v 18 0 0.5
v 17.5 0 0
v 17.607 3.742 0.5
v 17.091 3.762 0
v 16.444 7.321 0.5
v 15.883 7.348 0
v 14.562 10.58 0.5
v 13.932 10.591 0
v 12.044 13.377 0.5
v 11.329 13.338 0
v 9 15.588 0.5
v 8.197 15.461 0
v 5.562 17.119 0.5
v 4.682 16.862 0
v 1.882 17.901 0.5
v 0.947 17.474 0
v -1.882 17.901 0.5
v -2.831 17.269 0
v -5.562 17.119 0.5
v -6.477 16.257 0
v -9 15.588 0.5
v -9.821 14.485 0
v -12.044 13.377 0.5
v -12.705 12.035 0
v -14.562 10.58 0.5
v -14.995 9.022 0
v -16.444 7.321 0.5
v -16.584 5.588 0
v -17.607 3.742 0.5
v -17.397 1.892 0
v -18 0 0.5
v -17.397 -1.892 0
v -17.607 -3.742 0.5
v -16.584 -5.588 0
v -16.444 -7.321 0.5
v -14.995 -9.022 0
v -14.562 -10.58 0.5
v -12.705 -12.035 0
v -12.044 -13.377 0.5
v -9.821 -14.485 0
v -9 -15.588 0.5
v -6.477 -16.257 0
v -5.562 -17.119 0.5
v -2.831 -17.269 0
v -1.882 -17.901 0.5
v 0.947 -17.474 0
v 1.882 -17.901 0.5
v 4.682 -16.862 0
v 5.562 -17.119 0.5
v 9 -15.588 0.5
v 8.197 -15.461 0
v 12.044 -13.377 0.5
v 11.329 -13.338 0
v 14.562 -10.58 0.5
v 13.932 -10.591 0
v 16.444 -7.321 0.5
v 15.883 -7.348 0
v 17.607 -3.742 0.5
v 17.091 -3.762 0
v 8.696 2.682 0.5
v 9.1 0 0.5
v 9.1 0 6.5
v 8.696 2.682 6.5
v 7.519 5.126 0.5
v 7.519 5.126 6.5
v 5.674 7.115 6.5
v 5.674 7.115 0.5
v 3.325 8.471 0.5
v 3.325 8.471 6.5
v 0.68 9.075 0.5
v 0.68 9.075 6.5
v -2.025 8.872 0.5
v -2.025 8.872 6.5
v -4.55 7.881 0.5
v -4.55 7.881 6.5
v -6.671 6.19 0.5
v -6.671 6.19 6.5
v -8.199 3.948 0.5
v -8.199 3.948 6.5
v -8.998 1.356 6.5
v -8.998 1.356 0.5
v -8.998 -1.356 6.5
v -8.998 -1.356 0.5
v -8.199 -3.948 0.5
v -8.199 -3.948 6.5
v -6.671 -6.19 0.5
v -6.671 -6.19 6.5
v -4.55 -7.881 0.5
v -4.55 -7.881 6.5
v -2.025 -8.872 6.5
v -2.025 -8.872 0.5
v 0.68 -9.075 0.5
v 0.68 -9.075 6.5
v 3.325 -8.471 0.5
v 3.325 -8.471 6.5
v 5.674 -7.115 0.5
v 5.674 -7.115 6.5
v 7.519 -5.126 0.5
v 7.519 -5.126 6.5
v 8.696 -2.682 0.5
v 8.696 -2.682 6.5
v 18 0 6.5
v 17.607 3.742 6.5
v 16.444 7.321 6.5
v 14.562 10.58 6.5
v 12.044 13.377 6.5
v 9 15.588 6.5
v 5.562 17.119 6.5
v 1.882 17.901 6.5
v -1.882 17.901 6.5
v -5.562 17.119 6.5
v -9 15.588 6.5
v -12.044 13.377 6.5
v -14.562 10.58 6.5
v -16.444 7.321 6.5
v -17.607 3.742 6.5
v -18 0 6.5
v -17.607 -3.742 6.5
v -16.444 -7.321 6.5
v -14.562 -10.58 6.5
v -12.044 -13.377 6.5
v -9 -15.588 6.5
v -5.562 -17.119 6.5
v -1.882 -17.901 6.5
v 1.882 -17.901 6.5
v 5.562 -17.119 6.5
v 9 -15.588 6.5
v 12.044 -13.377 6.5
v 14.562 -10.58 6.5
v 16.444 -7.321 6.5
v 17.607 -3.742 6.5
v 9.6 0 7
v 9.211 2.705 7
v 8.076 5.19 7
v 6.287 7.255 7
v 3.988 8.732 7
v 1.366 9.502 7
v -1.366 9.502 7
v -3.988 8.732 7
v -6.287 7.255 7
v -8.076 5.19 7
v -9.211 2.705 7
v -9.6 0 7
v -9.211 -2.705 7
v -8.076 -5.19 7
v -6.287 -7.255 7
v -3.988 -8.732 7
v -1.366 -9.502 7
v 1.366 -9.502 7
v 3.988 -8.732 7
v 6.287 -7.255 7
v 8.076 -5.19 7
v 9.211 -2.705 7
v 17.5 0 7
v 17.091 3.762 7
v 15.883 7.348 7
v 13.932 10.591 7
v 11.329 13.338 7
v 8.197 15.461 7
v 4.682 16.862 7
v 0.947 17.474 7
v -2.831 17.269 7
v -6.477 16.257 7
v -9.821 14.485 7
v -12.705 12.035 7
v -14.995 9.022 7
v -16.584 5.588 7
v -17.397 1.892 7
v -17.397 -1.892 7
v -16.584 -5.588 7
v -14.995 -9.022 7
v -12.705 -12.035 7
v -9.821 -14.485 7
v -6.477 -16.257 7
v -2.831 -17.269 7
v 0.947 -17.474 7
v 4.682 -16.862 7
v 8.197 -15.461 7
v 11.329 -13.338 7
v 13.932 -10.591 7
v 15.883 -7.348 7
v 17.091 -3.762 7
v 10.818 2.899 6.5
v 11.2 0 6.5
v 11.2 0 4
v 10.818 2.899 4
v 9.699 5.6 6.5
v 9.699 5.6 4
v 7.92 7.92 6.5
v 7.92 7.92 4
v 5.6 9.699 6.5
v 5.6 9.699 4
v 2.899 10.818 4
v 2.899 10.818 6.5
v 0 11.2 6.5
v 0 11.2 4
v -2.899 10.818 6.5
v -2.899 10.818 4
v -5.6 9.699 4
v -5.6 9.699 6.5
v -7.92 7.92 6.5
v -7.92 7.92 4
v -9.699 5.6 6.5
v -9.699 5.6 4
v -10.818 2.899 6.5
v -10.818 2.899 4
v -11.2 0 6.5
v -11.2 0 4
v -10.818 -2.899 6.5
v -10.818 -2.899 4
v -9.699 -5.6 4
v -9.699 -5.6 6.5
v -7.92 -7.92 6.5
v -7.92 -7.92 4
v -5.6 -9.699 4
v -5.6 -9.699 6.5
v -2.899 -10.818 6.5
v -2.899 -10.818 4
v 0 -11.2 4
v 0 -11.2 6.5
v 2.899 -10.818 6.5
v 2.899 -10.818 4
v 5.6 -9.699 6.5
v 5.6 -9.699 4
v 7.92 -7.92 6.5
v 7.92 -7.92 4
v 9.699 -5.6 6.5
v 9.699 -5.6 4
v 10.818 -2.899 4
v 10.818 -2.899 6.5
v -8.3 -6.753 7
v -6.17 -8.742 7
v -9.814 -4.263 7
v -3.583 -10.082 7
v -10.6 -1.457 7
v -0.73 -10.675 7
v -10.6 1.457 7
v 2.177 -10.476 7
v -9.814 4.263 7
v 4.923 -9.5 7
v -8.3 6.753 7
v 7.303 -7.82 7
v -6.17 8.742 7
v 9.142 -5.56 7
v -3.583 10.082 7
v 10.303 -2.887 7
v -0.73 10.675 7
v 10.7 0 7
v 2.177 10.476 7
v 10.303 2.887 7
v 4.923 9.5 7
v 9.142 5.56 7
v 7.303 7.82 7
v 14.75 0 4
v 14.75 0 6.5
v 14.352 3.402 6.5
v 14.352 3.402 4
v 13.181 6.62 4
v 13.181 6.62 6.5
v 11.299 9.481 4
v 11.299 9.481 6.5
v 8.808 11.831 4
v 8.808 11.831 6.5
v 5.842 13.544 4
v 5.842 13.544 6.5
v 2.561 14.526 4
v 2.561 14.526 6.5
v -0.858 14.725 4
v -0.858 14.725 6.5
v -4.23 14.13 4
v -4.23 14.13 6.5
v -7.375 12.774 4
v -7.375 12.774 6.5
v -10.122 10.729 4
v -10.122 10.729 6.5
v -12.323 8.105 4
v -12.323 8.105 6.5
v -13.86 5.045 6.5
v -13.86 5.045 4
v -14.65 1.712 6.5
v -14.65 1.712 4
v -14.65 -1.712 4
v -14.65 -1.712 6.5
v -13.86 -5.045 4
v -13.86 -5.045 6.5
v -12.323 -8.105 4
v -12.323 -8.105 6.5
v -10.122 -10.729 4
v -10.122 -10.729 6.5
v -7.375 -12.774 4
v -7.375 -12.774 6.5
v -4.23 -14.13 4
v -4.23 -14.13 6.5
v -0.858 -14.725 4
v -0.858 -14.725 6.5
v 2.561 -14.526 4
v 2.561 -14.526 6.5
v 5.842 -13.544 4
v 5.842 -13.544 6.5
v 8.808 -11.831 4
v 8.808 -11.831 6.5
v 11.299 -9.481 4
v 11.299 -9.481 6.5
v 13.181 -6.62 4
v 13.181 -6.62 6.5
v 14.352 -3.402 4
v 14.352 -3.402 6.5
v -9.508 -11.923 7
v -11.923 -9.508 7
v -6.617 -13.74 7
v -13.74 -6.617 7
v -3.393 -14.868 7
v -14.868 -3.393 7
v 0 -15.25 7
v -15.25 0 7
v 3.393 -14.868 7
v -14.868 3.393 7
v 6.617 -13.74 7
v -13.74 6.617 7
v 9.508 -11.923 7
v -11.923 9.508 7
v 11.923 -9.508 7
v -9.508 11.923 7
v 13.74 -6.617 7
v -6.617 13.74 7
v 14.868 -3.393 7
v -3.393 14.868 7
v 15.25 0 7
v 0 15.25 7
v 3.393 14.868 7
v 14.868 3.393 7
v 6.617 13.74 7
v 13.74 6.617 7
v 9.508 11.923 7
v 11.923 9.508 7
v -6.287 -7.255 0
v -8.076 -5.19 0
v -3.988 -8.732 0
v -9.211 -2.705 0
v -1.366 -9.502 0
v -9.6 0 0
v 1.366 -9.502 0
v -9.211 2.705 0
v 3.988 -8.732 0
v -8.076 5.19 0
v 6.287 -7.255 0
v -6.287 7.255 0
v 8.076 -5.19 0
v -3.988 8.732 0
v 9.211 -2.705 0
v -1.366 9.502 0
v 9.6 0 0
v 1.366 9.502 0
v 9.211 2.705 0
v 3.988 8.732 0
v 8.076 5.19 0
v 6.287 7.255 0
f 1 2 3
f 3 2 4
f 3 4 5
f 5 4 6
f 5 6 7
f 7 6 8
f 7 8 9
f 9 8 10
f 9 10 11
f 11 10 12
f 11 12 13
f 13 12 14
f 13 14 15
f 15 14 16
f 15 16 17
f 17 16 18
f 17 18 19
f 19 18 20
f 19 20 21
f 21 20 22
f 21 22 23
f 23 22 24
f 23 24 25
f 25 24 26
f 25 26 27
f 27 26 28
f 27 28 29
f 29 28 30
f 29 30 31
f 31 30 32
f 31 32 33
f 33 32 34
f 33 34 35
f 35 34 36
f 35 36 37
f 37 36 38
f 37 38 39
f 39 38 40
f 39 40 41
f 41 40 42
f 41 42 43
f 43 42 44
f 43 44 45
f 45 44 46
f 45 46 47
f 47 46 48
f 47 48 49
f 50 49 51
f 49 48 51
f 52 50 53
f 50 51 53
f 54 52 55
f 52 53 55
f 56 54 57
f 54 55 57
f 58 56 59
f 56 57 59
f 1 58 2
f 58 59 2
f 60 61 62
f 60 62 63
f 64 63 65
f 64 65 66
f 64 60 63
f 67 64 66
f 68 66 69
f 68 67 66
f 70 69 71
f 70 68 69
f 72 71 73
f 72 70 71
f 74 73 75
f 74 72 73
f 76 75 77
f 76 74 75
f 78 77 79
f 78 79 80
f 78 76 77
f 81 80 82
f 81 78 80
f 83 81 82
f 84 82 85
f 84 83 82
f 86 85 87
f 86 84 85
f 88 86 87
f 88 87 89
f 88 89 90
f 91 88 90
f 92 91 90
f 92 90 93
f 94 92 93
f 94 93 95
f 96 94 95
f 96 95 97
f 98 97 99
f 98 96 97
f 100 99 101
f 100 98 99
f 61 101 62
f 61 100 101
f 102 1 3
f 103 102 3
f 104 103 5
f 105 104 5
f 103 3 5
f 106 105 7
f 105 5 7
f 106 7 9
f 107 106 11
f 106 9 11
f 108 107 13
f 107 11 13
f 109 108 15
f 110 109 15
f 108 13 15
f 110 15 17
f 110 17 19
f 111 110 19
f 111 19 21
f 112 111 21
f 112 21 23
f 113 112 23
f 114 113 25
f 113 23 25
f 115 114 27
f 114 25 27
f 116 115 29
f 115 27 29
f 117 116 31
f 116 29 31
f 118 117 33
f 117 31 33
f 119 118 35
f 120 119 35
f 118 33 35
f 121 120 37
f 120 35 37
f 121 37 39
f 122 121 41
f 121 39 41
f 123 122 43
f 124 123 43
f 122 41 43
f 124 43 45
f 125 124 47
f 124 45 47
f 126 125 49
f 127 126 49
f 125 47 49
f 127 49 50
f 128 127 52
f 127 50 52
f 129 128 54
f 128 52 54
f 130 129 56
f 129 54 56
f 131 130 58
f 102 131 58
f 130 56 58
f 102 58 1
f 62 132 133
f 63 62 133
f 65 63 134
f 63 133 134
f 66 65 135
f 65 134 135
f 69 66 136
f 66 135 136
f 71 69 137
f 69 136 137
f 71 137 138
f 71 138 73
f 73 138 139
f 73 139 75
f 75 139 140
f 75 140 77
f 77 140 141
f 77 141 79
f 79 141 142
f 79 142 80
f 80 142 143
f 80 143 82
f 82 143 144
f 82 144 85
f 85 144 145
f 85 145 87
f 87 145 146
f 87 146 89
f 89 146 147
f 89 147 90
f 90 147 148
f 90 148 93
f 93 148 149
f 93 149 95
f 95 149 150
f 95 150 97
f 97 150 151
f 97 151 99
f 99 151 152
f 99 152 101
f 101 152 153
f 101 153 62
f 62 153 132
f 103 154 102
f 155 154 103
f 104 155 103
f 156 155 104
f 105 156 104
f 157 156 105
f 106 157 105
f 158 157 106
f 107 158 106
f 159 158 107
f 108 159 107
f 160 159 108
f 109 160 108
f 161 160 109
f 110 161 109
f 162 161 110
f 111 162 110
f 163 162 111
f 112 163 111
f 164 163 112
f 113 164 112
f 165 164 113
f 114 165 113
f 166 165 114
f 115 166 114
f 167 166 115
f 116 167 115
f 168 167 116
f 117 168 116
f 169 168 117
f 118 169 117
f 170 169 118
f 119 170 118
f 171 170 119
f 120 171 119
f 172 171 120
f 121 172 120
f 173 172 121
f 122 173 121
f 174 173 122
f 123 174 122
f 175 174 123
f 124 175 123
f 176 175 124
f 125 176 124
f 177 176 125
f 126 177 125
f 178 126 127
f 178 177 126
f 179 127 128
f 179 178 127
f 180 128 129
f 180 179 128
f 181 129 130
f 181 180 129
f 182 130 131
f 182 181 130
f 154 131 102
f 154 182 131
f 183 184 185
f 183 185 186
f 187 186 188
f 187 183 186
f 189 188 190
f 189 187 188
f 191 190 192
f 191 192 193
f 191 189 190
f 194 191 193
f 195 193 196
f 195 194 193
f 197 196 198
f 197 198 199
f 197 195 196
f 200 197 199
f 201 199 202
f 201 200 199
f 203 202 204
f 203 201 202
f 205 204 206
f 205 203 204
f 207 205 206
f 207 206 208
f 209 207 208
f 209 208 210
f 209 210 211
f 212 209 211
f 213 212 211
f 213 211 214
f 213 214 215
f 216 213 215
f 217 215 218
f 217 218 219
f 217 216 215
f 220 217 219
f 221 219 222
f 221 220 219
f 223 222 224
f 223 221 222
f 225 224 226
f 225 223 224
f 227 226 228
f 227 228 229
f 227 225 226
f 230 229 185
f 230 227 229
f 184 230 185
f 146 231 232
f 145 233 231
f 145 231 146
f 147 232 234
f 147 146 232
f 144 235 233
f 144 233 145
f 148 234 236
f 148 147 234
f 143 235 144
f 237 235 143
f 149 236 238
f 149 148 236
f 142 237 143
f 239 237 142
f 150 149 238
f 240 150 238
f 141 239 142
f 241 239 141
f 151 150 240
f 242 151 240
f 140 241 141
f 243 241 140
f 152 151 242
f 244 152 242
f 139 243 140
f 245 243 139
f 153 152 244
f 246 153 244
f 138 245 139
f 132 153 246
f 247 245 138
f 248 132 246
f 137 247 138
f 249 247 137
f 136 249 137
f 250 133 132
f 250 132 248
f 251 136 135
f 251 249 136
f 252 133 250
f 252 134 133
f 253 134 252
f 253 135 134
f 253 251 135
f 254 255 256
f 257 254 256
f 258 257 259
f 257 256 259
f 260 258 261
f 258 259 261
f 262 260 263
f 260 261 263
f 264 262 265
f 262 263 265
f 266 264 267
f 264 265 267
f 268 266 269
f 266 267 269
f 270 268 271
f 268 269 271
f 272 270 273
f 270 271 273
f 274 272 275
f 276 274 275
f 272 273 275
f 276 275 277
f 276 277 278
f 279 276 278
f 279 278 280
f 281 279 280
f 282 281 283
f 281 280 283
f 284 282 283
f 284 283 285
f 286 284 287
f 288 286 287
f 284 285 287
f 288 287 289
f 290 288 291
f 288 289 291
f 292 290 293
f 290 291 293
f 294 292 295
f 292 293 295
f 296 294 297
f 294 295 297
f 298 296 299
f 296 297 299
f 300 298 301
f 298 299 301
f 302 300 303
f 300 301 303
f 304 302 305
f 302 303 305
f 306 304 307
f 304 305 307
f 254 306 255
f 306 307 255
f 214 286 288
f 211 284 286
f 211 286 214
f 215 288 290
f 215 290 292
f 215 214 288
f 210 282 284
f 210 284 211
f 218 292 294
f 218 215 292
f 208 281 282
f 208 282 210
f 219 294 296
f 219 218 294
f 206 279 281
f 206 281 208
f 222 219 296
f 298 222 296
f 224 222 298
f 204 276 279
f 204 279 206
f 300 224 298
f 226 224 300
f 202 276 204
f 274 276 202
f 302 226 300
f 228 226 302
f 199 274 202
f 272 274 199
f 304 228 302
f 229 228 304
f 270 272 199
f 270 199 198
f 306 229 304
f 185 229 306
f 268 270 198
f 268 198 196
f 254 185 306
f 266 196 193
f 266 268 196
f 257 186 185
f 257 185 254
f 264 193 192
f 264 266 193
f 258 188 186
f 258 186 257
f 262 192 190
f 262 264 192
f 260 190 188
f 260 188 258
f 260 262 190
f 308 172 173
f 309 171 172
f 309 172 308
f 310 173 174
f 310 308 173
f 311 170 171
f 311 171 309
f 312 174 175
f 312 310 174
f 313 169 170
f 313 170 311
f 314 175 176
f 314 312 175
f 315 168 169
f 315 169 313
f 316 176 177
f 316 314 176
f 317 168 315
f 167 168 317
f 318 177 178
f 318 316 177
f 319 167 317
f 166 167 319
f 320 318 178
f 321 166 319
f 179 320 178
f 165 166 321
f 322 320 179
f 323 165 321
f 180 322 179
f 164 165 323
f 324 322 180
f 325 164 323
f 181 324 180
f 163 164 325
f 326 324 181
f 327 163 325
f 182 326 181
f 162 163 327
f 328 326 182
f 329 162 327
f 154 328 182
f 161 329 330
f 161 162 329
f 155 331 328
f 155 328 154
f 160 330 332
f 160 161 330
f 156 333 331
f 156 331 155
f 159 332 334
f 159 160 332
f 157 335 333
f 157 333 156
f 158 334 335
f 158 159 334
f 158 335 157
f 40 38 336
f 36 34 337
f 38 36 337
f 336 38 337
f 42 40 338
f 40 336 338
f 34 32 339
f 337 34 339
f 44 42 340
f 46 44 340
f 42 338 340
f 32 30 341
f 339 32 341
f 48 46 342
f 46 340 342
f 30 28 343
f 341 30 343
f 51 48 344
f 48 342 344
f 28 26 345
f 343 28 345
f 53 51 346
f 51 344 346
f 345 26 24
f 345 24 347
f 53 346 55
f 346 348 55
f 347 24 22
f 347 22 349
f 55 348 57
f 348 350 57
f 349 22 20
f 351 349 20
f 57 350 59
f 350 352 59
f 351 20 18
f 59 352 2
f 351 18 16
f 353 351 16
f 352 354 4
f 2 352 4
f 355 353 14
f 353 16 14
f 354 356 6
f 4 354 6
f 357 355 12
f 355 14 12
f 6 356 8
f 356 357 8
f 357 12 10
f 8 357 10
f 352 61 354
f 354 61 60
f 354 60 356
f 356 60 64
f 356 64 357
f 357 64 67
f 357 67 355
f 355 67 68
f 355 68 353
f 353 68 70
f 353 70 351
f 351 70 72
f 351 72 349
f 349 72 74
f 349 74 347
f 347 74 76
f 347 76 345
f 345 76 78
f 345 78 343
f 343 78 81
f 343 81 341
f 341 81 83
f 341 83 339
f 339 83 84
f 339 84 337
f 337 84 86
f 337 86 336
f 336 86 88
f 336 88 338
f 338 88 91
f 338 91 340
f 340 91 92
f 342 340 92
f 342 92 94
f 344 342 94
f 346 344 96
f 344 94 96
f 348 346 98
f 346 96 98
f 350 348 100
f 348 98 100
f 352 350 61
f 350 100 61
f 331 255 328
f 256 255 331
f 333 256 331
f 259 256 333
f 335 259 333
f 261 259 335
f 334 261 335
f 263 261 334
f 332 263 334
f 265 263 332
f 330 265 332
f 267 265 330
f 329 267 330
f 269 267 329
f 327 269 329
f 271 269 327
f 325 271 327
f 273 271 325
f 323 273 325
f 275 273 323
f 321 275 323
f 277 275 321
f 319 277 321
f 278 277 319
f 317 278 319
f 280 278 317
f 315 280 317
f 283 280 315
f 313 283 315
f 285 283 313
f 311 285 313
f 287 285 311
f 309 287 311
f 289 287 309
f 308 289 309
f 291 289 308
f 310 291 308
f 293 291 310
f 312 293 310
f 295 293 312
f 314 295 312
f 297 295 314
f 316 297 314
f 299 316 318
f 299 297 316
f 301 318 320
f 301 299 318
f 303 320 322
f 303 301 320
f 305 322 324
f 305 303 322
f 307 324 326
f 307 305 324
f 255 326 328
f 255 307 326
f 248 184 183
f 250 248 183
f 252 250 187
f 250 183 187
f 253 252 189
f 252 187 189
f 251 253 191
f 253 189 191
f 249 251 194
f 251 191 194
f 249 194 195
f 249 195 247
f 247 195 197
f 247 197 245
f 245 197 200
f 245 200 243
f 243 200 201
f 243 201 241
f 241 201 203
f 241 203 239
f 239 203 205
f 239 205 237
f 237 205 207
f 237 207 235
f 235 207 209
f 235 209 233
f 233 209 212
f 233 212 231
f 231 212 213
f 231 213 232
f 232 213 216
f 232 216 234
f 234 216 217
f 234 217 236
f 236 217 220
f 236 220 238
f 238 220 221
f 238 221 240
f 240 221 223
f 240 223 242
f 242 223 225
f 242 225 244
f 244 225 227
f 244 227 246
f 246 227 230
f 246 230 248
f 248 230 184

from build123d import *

# Parameters (mm, degrees)
CROQUIS1_R              = 18
CROQUIS1_R_2            = 9.1
SALIENTE_EXTRUIR1_DEPTH = 7
CROQUIS2_R              = 14.75
CROQUIS2_R_2            = 11.2
CORTAR_EXTRUIR1_DEPTH   = 3
CHAFL_N1_SIZE           = 0.5


with BuildPart() as part:
    # Croquis1 → Saliente-Extruir1 (new body)
    with BuildSketch(Plane.XY):
        Circle(CROQUIS1_R)
        Circle(CROQUIS1_R_2, mode=Mode.SUBTRACT)
    extrude(amount=SALIENTE_EXTRUIR1_DEPTH)

    # Croquis2 → Cortar-Extruir1 (cut)
    with BuildSketch(Plane.XY.offset(7)):
        Circle(CROQUIS2_R)
        Circle(CROQUIS2_R_2, mode=Mode.SUBTRACT)
    extrude(amount=-CORTAR_EXTRUIR1_DEPTH, mode=Mode.SUBTRACT)

    # Chaflán1
    chafl_n1_edges = [part.edges().sort_by_distance(p)[0] for p in [
        (-14.75, 0, 7),
        (-11.2, 0, 7),
        (-18, 0, 0),
        (-18, 0, 7),
        (-9.1, 0, 0),
        (-9.1, 0, 7),
    ]]
    chamfer(chafl_n1_edges, length=CHAFL_N1_SIZE)


solid = part.part
